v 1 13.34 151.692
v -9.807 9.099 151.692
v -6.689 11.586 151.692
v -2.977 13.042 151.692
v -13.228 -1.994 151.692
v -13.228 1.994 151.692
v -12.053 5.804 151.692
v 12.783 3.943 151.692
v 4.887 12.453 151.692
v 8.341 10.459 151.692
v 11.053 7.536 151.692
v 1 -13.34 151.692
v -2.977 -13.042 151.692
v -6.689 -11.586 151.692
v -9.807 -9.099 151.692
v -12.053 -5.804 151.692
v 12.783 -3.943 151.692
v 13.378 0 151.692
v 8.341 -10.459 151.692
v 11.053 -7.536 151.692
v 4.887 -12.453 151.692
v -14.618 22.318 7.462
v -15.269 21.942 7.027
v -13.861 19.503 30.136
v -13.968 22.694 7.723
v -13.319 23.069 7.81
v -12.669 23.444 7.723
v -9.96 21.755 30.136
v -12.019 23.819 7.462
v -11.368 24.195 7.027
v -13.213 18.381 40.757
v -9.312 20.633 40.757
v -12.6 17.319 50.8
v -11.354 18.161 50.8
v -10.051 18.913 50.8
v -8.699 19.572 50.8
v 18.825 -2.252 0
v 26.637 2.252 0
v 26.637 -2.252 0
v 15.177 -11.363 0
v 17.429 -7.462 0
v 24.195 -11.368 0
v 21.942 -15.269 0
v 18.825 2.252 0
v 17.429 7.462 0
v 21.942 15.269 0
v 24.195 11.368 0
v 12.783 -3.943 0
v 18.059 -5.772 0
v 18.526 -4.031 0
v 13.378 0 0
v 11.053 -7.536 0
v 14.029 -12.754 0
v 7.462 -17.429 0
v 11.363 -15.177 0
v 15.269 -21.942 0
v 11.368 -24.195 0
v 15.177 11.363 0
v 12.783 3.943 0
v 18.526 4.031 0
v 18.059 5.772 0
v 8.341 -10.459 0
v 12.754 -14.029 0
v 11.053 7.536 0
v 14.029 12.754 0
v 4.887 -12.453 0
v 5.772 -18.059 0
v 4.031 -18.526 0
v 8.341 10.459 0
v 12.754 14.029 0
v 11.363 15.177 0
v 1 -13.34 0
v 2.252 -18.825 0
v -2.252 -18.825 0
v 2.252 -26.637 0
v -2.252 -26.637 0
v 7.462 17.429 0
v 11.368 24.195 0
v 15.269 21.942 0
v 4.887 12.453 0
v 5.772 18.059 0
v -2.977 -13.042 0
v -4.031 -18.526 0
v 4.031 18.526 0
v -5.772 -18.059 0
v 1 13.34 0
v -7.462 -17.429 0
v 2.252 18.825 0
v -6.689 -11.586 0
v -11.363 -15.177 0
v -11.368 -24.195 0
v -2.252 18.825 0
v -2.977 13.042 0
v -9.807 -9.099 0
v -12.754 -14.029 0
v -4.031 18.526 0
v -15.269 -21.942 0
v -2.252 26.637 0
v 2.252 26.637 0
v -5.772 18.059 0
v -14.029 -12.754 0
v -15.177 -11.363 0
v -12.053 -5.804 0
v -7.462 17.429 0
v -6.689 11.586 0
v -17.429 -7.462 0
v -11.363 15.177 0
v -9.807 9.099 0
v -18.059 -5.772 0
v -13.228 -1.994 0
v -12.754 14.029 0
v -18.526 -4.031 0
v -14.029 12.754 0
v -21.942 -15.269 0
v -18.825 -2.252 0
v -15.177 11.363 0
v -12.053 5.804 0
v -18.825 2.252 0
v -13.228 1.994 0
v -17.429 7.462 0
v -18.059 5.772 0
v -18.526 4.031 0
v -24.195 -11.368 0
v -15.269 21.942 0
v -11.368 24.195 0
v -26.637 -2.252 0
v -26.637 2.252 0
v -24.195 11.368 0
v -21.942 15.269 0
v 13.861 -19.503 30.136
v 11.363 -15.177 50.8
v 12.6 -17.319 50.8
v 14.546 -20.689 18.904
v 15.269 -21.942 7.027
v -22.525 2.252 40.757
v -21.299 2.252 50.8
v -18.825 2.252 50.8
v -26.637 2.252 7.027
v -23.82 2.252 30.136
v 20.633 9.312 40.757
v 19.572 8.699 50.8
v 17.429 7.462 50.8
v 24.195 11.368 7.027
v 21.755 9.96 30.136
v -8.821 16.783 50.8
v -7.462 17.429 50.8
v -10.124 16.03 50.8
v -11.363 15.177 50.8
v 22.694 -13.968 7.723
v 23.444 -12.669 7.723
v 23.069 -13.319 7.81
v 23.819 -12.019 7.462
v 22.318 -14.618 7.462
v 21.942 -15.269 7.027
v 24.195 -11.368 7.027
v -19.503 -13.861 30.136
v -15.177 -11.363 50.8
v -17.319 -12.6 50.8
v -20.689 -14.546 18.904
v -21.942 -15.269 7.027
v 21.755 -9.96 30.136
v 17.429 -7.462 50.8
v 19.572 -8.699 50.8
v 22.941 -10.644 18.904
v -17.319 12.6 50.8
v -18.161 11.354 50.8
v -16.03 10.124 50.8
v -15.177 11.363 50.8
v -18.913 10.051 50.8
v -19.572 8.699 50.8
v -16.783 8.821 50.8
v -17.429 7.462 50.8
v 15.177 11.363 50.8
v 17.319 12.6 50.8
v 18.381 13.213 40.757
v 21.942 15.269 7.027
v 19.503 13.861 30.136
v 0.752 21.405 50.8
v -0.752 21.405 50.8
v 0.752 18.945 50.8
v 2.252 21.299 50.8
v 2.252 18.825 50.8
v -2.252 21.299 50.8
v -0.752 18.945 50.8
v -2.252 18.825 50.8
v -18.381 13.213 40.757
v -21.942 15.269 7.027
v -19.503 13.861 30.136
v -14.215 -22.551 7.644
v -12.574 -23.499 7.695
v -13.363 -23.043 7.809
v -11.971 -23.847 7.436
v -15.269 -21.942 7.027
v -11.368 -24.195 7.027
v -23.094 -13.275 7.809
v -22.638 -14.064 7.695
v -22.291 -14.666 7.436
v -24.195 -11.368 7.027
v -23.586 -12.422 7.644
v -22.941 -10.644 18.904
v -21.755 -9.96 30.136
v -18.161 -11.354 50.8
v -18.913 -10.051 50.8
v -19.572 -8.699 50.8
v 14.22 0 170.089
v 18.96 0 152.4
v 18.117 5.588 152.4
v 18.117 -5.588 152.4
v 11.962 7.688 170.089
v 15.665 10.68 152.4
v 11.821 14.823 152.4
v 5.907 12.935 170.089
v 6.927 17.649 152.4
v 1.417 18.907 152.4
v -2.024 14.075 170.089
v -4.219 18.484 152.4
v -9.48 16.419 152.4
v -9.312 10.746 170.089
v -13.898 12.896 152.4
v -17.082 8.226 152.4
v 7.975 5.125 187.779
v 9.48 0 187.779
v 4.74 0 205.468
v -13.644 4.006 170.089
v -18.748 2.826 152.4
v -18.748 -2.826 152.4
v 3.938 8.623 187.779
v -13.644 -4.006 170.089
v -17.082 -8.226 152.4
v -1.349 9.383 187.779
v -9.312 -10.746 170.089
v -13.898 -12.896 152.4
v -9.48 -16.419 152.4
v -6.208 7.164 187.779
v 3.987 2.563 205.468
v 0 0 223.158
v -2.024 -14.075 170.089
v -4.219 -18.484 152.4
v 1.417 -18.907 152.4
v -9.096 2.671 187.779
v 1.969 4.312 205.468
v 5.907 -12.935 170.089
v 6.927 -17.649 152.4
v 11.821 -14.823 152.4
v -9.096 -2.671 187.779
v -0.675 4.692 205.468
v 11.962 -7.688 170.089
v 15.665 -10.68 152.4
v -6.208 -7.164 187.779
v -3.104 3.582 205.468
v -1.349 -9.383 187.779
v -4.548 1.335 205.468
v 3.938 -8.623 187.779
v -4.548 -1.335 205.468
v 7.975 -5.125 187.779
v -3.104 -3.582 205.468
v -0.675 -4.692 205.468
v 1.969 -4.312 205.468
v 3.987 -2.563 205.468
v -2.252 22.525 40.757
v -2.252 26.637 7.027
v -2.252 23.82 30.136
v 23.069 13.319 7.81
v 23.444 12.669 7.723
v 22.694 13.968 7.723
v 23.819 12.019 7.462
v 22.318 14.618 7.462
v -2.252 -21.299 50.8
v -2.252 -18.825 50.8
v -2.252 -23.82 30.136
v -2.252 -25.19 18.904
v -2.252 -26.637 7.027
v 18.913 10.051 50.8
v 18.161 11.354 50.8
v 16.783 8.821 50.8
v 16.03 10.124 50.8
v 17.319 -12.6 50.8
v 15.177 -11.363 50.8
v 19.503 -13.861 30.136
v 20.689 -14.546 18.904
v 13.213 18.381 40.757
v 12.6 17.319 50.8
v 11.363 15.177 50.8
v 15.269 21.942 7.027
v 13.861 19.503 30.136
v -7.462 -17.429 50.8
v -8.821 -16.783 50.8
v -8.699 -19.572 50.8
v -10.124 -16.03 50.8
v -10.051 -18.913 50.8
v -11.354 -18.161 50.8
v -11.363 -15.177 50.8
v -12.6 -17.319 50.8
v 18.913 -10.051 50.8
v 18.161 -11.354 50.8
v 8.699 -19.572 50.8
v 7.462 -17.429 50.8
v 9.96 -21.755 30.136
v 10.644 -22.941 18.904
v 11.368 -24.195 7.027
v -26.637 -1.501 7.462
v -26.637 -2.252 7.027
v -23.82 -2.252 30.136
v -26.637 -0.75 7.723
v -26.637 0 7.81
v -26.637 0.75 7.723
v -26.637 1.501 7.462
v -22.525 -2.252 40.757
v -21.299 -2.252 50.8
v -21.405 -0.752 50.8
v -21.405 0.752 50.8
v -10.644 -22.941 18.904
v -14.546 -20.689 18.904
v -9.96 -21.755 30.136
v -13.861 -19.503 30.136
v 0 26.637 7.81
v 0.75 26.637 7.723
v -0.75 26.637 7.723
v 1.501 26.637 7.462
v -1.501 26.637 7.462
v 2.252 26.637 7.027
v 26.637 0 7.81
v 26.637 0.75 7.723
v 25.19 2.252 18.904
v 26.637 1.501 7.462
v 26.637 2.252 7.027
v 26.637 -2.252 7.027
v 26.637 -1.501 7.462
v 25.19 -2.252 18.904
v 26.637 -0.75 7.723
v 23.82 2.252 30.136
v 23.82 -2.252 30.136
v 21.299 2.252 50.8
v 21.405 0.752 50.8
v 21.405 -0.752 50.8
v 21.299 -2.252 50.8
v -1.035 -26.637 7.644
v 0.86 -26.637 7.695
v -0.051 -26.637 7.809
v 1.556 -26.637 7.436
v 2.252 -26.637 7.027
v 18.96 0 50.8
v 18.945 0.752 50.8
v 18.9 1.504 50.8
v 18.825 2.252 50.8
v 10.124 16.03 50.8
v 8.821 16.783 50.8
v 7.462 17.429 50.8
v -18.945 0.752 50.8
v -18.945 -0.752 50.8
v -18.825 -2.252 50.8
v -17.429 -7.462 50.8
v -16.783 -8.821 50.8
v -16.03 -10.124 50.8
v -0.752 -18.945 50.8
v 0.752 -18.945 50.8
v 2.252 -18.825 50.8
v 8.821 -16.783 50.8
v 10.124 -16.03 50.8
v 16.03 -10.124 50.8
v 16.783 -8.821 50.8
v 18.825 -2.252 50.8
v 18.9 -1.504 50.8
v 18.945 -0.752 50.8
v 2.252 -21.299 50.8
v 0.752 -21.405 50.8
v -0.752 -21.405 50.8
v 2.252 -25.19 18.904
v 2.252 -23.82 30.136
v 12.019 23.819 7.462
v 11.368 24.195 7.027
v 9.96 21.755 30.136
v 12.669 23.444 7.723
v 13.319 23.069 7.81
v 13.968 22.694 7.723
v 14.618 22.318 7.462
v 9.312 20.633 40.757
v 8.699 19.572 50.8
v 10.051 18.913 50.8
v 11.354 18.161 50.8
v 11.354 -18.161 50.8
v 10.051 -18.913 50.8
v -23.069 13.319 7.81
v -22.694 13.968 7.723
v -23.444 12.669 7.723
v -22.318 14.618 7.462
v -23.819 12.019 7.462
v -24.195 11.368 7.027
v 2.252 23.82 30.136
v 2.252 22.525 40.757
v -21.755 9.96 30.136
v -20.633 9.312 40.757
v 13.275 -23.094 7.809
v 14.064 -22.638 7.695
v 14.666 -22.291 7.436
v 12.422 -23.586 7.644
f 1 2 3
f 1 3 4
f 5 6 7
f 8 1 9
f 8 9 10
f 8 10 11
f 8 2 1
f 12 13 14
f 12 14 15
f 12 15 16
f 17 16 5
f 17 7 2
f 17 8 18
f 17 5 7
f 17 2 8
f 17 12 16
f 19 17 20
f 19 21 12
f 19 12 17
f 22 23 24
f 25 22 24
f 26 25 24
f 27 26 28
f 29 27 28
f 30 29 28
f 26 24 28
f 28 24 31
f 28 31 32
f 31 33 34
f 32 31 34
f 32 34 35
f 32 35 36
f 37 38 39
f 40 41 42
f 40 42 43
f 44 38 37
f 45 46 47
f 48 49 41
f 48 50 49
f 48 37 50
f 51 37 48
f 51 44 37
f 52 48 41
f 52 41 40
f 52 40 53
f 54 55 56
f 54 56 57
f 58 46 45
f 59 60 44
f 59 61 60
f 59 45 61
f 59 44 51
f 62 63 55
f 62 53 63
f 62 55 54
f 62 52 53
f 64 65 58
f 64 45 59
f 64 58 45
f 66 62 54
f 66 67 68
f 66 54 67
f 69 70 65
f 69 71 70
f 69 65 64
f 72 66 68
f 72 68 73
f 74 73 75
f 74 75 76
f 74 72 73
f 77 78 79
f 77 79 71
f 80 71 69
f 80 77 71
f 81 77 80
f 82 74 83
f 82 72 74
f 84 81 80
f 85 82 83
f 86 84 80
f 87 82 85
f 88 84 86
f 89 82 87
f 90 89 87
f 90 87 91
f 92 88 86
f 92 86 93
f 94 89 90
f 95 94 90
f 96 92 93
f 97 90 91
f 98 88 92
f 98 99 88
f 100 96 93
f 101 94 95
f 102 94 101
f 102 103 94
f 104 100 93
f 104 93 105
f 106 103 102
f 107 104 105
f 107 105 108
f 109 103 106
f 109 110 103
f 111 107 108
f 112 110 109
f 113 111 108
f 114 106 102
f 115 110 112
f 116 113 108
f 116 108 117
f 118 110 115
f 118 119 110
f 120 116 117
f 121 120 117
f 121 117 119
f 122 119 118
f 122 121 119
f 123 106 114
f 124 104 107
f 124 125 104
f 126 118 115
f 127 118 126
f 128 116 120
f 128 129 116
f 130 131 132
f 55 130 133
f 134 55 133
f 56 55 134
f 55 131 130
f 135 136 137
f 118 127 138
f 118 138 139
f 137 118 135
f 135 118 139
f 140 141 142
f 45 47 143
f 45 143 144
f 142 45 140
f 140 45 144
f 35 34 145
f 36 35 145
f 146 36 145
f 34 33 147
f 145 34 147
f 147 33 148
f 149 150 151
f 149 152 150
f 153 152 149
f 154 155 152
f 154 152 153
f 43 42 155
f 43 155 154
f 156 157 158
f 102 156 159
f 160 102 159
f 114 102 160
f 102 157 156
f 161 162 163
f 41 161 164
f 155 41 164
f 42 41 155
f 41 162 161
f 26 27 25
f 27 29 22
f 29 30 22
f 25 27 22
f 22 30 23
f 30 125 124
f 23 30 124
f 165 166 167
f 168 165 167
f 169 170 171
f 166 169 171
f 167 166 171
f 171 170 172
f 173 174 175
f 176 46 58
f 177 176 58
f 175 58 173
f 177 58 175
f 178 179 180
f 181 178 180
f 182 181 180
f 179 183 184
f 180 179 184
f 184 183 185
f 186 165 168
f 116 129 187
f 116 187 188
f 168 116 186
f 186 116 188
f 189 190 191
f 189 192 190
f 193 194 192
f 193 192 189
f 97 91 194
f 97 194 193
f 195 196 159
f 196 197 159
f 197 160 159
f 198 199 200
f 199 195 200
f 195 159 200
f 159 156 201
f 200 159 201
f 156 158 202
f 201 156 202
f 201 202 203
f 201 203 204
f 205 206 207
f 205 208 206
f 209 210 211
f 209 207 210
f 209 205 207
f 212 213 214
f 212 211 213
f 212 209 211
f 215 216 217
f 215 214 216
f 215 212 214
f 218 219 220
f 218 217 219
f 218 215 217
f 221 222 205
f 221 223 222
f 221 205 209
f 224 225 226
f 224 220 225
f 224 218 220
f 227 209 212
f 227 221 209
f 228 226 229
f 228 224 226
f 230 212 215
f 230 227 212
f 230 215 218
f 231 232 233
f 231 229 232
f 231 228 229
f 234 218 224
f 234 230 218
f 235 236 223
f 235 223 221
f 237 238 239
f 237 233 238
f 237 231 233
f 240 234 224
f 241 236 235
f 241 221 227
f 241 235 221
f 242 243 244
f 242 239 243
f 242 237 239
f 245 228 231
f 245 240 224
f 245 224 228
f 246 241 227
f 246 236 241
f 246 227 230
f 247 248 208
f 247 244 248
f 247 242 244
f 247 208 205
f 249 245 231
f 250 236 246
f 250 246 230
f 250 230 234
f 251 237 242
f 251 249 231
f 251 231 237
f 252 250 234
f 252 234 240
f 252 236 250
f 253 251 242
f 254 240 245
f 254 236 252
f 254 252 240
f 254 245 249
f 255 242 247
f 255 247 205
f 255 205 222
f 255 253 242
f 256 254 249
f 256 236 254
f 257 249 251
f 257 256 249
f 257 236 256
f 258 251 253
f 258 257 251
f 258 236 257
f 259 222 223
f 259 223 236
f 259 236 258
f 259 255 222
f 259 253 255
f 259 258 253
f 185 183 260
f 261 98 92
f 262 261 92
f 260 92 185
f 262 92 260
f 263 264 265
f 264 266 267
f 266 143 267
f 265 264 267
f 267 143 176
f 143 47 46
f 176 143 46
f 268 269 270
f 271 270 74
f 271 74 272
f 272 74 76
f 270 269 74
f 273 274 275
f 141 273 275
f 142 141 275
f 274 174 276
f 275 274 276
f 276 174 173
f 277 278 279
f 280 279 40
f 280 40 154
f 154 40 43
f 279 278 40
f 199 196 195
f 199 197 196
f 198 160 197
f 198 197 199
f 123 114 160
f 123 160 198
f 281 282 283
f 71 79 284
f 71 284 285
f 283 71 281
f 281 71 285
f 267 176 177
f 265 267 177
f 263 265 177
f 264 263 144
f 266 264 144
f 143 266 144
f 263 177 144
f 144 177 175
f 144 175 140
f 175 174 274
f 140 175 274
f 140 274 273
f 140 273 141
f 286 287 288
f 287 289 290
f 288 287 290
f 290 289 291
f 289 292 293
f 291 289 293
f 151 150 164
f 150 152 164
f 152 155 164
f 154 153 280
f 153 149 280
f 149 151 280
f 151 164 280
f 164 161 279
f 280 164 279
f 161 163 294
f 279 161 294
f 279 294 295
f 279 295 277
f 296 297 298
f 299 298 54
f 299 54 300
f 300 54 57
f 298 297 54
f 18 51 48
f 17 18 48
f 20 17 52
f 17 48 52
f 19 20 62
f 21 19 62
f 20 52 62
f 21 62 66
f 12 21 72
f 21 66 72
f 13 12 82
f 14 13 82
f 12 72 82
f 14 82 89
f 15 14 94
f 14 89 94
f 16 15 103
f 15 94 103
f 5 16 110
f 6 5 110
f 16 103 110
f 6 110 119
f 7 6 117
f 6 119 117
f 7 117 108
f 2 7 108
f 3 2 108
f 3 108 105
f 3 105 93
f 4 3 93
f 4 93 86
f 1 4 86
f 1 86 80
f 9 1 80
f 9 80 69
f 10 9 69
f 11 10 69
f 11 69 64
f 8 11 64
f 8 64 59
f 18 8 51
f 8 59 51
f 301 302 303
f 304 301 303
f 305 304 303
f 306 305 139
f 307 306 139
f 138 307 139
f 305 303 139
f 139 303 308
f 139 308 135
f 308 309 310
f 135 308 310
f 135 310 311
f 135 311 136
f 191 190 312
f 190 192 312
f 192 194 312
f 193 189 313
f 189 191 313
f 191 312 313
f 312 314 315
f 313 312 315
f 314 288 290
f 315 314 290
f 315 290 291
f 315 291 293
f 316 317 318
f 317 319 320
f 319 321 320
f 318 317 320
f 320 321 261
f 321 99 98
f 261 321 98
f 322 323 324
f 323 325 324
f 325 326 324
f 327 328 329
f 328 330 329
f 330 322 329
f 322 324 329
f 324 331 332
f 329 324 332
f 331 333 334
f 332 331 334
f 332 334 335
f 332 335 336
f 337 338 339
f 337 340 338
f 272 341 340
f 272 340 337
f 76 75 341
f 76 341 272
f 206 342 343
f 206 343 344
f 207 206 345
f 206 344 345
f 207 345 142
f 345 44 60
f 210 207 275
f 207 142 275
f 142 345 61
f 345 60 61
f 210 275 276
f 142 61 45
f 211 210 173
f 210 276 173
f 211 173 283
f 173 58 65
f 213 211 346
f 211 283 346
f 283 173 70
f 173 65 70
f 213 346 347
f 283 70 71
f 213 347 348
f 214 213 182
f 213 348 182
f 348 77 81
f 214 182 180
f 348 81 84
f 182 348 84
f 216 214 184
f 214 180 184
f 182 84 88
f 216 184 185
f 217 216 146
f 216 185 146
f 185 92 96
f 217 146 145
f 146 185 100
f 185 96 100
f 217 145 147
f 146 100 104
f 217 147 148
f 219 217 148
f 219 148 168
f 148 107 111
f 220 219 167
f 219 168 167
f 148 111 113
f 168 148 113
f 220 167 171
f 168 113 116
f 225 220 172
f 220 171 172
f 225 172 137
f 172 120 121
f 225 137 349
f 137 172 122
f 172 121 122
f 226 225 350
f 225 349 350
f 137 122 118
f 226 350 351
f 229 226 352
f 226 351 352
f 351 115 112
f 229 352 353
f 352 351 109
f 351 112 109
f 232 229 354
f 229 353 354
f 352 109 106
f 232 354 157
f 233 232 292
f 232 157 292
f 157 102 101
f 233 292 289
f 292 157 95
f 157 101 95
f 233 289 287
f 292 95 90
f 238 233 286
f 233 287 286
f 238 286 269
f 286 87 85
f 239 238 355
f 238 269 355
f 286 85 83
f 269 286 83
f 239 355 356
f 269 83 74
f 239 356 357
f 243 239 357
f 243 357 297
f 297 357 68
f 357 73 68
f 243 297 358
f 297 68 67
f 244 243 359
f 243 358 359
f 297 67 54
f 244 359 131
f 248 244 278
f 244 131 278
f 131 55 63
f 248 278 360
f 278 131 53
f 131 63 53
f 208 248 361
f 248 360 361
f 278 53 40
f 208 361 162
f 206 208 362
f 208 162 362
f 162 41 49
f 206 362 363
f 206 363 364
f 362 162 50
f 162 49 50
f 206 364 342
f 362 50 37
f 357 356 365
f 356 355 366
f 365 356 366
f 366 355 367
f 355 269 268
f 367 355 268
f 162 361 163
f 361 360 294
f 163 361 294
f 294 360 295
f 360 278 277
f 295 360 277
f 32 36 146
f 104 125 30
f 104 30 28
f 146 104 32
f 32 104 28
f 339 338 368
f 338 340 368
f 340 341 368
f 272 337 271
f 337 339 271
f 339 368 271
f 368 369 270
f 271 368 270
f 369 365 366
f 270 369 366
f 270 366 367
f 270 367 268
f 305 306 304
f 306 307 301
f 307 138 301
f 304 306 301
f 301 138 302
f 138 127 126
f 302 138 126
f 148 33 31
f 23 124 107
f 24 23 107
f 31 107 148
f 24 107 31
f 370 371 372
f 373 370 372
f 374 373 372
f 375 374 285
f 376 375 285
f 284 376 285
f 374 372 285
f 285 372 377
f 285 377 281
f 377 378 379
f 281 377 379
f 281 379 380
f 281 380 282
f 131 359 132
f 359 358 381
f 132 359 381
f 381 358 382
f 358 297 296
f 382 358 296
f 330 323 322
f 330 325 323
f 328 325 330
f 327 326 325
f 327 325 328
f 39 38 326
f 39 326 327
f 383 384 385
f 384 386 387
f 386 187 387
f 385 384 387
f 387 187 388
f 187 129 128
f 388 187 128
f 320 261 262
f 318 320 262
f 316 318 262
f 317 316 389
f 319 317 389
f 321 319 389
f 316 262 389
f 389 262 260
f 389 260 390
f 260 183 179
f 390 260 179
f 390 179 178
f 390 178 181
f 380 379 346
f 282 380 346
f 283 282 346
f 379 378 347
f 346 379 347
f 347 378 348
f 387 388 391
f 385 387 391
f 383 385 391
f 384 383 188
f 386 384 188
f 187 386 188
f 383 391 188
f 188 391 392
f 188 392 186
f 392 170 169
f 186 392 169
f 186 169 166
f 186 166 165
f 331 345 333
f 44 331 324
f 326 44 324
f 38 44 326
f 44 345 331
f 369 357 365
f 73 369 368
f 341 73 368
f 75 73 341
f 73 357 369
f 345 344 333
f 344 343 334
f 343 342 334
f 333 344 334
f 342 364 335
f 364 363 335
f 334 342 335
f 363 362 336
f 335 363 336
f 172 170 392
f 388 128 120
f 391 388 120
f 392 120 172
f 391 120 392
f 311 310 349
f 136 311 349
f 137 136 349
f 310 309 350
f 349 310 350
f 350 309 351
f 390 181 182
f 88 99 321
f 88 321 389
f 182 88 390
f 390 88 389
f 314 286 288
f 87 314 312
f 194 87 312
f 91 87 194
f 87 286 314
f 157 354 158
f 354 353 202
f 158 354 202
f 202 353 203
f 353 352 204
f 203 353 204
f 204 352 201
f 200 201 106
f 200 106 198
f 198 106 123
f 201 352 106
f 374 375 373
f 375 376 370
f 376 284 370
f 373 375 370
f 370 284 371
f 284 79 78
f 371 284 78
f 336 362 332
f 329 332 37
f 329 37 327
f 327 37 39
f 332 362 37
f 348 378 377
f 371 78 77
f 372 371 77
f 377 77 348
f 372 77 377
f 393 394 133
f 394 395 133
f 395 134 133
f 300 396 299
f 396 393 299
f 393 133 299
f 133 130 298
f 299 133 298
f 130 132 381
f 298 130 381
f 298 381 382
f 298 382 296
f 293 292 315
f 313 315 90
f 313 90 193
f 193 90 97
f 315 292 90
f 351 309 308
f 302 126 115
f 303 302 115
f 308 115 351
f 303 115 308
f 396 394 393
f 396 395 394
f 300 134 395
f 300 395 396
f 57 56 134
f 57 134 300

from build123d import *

# Parameters (mm, degrees)
F0_R      = 18.9595405406
F1_DEPTH  = 152.4
F2_R      = 18.9595405406
F3_DEPTH  = 76.2
F3_TAPER  = 15
F4_W      = 53.2747134566
F4_H      = 4.5048468746
F5_DEPTH  = 50.8
F9_COUNT  = 8
F9_ANGLE  = 210
F10_R     = 13.3778367219
F11_DEPTH = 151.692


with BuildPart() as f1:
    # F0 (on Top) → F1 (new body)
    with BuildSketch(Plane.XY):
        Circle(F0_R)
    extrude(amount=F1_DEPTH)

    # F2 (on face) → F3 (join)
    with BuildSketch(Plane.XY.offset(152.4)):
        Circle(F2_R)
    extrude(amount=F3_DEPTH, taper=F3_TAPER)

    # F4 (on face) → F5 (join)
    with BuildSketch(Plane(origin=(0, 0, 0), x_dir=(1, 0, 0), z_dir=(0, 0, -1))):
        Rectangle(F4_W, F4_H)
    extrude(amount=-F5_DEPTH)

    # F6 (on Front) → F7 (revolve, cut)
    with BuildSketch(Plane.XZ):
        Polygon((-27.585586533, 0), (-21.0148207843, 54.1184917092), (-34.3035459518, 55.4788671434), align=None)
    revolve(axis=Axis((0, 0, -8.6749633774), (0, 0, -1)), mode=Mode.SUBTRACT)

    # F9: F1 ×8 about axis
    f9_axis = Axis((0, 0, -6.7568952218), (0, 0, -1))


with BuildPart() as f1_1:
    add(f1.part)
    for i in range(1, F9_COUNT):
        add(f1.part.rotate(f9_axis, i * F9_ANGLE / (F9_COUNT - 1)))

    # F10 (on face) → F11 (cut)
    with BuildSketch(Plane(origin=(0, 0, 0), x_dir=(1, 0, 0), z_dir=(0, 0, -1))):
        Circle(F10_R)
    extrude(amount=-F11_DEPTH, mode=Mode.SUBTRACT)


solid = f1_1.part
